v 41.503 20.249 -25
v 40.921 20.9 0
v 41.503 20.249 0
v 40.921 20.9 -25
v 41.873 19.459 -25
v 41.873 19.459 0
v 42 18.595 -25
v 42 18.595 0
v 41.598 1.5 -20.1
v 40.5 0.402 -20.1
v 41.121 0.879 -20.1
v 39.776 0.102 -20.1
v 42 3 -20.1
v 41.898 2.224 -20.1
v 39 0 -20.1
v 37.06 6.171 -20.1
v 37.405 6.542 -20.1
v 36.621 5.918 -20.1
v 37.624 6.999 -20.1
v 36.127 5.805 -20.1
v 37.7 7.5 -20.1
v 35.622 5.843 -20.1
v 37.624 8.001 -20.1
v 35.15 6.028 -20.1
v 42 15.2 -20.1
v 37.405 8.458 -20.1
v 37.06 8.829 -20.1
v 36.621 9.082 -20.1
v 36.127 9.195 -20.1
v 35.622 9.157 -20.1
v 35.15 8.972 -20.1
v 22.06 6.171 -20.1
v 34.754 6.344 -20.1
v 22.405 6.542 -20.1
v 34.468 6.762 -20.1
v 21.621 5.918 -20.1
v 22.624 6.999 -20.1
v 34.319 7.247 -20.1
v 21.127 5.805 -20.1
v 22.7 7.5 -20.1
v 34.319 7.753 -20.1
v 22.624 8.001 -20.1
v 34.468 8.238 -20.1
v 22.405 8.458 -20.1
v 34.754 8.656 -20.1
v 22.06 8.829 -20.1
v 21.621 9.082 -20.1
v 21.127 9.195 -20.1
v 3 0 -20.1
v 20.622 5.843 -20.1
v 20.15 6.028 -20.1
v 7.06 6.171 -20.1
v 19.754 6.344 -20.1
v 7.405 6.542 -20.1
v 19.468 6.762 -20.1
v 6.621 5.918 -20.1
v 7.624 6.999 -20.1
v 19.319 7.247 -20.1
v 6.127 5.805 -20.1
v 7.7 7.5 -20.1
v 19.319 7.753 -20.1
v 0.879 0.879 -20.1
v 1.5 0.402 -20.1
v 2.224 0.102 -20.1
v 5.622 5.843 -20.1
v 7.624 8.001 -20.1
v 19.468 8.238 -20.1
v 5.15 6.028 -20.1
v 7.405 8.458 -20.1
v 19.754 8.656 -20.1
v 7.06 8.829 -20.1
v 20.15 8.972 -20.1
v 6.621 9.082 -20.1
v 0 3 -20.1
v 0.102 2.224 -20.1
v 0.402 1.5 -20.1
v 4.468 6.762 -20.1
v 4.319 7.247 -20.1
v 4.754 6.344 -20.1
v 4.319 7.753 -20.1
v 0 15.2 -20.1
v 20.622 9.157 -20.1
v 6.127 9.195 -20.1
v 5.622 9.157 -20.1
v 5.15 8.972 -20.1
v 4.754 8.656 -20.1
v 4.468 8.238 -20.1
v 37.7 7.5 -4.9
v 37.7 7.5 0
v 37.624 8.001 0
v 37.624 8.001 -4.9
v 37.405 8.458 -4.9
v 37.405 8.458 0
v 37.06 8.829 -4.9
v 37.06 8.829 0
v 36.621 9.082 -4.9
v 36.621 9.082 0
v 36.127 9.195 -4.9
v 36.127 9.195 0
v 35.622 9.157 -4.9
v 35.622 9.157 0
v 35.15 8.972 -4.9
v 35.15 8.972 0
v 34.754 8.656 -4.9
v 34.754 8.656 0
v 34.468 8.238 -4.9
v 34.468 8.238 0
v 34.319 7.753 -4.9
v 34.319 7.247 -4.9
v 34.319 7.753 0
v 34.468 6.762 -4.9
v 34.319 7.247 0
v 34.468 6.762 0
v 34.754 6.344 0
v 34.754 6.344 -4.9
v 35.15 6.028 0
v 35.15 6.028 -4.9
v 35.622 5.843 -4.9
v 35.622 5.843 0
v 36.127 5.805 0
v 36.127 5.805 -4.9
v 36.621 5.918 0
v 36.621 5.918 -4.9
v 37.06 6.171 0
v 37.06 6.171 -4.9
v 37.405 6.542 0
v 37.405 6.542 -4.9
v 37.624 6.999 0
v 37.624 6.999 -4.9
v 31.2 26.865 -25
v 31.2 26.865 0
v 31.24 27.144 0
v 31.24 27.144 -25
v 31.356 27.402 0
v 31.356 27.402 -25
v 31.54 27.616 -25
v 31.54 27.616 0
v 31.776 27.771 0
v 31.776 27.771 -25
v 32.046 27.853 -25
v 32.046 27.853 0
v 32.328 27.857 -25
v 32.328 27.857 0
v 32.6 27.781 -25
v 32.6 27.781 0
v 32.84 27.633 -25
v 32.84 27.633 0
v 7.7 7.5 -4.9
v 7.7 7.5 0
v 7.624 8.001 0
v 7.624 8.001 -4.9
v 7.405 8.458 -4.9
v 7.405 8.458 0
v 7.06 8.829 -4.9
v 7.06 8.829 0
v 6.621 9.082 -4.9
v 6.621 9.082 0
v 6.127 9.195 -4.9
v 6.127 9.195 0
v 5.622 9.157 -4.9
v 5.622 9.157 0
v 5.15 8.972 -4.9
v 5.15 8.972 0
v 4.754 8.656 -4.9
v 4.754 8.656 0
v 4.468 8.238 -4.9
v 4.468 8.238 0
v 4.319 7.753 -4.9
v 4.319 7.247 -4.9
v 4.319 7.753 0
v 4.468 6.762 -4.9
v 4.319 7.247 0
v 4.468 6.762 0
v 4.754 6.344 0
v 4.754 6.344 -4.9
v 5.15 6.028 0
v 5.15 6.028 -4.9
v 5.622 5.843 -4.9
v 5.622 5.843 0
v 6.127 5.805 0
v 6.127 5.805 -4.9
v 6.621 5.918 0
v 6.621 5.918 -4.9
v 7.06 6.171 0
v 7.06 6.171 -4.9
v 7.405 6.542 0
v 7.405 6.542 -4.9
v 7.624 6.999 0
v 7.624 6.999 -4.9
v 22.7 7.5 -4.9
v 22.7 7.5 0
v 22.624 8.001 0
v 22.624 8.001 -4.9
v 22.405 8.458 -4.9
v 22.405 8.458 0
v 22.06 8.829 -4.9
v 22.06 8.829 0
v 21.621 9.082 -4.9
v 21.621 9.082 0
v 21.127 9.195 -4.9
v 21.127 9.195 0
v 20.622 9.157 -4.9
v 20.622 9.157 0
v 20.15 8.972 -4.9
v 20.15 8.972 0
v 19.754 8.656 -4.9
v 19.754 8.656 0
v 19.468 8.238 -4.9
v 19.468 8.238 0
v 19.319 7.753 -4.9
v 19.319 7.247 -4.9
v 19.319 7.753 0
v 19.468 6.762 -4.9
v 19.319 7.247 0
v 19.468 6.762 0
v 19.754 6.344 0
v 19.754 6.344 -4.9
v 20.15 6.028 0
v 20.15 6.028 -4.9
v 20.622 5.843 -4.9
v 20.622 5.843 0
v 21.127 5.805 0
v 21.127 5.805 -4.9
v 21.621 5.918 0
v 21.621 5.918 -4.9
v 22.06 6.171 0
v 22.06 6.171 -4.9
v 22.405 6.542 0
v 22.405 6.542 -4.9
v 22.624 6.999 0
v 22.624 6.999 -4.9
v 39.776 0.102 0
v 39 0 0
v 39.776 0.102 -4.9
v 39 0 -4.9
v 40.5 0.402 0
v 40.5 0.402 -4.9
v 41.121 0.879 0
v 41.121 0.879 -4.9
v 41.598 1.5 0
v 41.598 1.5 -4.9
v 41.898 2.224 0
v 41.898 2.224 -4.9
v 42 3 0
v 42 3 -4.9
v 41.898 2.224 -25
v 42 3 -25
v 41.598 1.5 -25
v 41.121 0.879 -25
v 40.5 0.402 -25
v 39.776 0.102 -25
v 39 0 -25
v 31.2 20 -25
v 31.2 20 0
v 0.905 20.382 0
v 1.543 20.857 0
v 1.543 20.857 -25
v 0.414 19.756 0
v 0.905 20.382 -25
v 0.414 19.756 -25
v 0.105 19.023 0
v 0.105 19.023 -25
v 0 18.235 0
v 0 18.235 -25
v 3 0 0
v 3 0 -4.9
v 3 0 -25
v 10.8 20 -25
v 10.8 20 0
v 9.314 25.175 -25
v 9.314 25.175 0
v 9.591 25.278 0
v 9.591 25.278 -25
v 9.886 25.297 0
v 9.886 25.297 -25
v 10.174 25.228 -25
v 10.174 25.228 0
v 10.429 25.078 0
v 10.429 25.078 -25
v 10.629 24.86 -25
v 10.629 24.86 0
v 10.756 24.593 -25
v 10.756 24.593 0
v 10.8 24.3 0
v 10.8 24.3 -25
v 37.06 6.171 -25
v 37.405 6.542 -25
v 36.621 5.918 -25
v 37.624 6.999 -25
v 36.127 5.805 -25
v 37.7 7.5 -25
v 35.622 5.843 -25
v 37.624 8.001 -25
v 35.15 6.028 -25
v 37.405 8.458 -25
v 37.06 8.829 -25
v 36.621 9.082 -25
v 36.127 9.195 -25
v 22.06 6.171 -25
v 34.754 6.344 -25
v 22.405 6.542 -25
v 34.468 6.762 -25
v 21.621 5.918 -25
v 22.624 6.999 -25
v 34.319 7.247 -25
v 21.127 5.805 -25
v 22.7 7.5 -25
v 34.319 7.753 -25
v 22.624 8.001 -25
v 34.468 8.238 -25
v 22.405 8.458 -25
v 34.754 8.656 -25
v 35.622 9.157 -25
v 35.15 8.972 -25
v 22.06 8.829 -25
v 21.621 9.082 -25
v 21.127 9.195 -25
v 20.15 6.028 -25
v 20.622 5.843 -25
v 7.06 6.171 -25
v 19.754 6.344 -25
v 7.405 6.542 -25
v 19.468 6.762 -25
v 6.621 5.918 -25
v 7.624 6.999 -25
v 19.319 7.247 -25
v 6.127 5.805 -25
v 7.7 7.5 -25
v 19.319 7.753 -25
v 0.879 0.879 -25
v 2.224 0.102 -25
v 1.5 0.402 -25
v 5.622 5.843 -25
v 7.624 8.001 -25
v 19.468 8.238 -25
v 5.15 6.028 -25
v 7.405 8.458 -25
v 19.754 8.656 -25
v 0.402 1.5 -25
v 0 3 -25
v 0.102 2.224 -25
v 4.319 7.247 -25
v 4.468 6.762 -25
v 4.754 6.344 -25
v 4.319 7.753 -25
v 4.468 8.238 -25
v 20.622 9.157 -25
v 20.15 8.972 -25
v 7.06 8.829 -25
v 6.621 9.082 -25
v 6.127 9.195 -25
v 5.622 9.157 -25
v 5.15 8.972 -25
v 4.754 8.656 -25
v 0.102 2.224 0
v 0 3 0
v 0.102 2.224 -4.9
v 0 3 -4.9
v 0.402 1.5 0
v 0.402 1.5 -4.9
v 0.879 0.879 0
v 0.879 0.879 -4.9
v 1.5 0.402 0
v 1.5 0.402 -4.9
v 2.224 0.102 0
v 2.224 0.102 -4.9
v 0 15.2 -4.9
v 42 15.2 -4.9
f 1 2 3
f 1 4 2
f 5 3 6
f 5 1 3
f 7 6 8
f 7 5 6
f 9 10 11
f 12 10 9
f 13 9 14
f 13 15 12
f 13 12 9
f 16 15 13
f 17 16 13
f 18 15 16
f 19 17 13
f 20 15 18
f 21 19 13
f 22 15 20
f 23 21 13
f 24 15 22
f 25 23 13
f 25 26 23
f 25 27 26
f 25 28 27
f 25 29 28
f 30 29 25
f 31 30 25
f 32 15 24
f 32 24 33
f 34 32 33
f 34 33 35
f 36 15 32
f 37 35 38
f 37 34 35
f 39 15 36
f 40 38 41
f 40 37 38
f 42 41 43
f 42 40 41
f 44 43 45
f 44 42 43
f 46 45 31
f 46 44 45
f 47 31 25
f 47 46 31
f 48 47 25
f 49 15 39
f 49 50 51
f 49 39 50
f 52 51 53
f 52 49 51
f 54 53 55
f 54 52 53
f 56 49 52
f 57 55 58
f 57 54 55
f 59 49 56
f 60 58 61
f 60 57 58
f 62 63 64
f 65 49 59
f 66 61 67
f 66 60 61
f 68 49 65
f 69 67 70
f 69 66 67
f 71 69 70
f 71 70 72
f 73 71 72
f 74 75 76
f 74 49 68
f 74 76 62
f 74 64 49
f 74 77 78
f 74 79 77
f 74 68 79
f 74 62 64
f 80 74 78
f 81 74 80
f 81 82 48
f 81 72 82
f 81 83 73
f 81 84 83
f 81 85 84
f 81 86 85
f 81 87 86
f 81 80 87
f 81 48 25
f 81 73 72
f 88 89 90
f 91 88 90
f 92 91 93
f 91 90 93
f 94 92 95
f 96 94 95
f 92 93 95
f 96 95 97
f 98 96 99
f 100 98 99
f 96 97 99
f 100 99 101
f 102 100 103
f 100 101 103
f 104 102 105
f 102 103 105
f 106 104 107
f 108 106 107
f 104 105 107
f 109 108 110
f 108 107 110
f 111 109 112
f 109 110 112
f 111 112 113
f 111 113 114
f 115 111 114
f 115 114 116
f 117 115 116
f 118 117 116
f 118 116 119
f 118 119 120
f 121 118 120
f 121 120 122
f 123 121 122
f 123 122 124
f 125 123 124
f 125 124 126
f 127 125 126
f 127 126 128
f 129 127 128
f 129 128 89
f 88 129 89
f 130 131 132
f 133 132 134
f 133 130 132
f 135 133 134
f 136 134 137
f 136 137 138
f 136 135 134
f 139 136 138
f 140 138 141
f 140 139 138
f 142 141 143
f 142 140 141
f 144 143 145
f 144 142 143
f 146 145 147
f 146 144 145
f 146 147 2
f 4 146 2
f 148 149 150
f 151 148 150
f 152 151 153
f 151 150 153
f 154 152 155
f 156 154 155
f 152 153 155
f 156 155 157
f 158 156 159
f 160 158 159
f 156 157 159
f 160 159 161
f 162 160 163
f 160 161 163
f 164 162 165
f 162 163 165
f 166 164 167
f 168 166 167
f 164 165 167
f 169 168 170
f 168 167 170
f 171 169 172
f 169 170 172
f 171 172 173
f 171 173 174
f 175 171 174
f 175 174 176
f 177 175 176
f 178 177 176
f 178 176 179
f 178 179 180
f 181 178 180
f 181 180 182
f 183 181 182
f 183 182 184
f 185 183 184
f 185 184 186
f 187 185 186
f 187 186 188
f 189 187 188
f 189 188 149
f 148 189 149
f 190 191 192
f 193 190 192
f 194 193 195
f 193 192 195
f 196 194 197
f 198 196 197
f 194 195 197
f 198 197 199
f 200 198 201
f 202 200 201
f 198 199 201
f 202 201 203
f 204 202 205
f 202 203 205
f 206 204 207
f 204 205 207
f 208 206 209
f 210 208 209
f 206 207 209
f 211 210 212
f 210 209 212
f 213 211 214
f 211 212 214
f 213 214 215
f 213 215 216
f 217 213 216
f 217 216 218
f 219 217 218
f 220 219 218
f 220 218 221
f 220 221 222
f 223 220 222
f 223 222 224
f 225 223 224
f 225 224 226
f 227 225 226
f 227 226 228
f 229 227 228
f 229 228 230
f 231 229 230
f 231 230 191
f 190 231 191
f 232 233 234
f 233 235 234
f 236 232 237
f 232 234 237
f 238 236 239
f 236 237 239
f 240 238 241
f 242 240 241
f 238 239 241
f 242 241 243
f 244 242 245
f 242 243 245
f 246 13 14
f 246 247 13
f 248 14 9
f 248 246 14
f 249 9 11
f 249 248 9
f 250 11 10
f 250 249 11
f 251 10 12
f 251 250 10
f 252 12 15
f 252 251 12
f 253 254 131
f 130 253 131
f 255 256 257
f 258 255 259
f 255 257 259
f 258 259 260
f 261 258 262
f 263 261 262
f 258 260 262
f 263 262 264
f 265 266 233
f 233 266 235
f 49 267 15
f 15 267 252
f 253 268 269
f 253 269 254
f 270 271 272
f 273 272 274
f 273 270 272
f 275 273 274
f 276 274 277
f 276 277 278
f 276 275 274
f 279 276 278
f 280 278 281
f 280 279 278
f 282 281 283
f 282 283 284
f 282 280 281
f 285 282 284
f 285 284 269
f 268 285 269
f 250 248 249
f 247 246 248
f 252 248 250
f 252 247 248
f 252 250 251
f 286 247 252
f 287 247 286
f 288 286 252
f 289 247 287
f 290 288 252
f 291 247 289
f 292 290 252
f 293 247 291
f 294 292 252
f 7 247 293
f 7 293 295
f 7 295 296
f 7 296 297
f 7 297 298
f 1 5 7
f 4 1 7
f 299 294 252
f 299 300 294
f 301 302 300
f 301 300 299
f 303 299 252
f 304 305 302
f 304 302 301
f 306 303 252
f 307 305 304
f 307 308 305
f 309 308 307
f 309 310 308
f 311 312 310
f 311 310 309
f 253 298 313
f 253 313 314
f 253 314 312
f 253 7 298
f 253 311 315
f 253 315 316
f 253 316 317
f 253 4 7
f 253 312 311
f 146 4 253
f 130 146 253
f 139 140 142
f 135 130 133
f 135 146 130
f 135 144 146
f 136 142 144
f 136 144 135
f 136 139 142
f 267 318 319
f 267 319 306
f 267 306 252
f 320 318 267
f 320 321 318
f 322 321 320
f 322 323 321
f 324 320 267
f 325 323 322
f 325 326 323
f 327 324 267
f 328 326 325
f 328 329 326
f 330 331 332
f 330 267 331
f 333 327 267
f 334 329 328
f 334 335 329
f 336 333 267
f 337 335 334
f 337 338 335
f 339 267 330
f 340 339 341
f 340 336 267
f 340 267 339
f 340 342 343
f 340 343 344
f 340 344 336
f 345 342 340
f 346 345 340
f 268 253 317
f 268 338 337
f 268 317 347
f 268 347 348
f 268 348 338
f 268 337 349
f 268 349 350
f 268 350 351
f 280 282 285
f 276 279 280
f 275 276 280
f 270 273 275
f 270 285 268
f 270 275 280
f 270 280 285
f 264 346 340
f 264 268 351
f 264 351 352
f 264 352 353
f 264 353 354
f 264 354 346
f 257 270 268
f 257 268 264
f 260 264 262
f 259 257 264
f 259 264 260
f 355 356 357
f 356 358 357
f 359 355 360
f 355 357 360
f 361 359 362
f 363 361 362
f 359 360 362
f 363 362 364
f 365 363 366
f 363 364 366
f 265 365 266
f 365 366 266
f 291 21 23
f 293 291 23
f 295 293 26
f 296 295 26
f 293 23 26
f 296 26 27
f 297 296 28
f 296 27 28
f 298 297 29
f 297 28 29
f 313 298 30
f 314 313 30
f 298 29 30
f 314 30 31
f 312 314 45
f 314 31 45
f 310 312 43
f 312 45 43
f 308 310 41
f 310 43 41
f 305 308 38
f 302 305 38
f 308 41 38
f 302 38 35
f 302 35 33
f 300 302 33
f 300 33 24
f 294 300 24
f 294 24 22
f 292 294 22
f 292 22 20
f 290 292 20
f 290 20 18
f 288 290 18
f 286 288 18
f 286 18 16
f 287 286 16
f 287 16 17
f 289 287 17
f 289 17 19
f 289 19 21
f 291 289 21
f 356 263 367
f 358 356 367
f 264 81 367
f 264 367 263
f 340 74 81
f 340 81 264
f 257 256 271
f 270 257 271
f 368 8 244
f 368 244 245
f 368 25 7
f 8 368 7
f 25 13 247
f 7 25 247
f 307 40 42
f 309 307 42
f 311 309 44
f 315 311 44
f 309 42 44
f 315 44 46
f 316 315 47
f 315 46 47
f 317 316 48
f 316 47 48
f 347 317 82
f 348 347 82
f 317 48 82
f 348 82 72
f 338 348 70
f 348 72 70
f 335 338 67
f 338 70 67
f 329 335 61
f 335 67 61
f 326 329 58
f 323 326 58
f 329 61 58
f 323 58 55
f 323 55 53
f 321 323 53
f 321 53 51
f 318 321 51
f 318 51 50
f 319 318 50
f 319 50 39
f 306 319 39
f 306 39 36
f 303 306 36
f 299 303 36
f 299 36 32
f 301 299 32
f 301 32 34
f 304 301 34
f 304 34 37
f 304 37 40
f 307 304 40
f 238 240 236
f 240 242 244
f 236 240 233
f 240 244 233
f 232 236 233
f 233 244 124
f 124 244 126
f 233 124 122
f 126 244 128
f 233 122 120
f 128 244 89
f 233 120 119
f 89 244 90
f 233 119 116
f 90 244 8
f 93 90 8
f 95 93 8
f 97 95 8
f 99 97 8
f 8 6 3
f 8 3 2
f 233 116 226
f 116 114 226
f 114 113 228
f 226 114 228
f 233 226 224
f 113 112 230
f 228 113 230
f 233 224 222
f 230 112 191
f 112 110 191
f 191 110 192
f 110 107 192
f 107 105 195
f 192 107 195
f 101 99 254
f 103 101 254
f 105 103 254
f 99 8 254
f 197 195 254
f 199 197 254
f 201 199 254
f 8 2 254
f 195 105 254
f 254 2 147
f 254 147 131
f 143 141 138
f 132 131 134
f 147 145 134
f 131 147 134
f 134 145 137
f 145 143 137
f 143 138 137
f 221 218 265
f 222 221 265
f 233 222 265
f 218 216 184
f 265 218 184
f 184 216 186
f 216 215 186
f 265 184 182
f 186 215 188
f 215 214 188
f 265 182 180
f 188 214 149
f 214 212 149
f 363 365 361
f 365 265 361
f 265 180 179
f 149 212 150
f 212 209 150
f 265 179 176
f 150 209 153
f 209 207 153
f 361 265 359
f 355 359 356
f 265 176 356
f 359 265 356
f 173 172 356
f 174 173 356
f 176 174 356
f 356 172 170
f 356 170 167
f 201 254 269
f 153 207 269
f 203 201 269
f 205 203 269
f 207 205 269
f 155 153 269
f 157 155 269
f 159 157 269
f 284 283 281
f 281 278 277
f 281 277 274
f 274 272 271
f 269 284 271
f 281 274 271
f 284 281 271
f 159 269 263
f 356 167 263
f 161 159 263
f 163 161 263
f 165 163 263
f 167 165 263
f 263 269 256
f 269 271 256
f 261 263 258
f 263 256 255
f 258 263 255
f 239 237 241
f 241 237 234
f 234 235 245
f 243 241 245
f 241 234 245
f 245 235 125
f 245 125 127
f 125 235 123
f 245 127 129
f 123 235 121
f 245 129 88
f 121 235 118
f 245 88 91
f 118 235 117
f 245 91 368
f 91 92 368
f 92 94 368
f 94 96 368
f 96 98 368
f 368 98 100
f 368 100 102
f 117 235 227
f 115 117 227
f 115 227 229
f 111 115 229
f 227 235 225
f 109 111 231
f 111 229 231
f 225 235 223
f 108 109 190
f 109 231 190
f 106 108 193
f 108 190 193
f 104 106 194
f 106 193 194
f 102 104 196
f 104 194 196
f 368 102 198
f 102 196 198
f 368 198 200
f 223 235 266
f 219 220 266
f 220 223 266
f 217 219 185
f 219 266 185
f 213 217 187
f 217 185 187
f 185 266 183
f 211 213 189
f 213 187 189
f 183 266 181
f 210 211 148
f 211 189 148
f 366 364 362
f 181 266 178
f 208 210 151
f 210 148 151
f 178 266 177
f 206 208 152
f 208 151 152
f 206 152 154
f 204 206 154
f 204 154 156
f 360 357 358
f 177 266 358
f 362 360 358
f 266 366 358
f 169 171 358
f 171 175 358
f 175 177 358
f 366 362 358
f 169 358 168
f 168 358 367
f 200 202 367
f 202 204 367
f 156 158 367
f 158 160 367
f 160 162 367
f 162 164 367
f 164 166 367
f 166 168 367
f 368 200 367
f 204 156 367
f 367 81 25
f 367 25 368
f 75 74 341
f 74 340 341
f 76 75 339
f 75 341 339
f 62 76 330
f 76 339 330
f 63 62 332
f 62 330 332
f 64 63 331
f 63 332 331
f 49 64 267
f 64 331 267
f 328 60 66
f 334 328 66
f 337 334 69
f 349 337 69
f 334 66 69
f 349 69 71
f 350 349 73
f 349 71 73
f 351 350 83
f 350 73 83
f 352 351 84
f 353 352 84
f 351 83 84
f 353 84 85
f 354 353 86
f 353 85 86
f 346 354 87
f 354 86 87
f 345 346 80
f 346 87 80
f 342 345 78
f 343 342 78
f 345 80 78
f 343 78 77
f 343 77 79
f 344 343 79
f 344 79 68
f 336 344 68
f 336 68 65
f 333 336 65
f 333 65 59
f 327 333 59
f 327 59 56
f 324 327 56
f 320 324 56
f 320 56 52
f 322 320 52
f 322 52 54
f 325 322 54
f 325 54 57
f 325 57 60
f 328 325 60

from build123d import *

# Parameters (mm, degrees)
SKETCH_1_W          = 42
SKETCH_1_H          = 25
EXTRUDE_1_DEPTH     = 20
SKETCH_2_W          = 15.2
SKETCH_2_H          = 15.2
CUT_EXTRUDE_1_DEPTH = 53.810983706
EXTRUDE_2_DEPTH     = 25
SKETCH_5_R          = 1.7
CUT_EXTRUDE_2_DEPTH = 57.833088954
FILLET_1_R          = 3
FILLET_3_R          = 1


with BuildPart() as part:
    # 草图1 → 凸台-拉伸1 (new body)
    with BuildSketch(Plane(origin=(0, 0, 0), x_dir=(1, 0, 0), z_dir=(0, 1, 0))):
        with Locations((21, 12.5)):
            Rectangle(SKETCH_1_W, SKETCH_1_H)
    extrude(amount=EXTRUDE_1_DEPTH)

    # 草图2 → 切除-拉伸1 (cut, through all)
    with BuildSketch(Plane.ZY):
        with Locations((-12.5, 7.6)):
            Rectangle(SKETCH_2_W, SKETCH_2_H)
    extrude(amount=-CUT_EXTRUDE_1_DEPTH, mode=Mode.SUBTRACT)

    # 草图4 → 凸台-拉伸2 (add)
    with BuildSketch(Plane.XY):
        Polygon((10.8, 26), (10.8, 20), (0, 20), align=None)
        Polygon((31.2, 20), (31.2, 29), (42, 20), align=None)
    extrude(amount=-EXTRUDE_2_DEPTH)

    # 草图5 → 切除-拉伸2 (cut, through all)
    with BuildSketch(Plane.XY):
        with Locations((6, 7.5)):
            Circle(SKETCH_5_R)
        with Locations((21, 7.5)):
            Circle(SKETCH_5_R)
        with Locations((36, 7.5)):
            Circle(SKETCH_5_R)
    extrude(amount=-CUT_EXTRUDE_2_DEPTH, mode=Mode.SUBTRACT)

    # 圆角1
    fillet_1_edges = [part.edges().sort_by_distance(p)[0] for p in [
        (42, 20, -12.5),
        (0, 0, -2.45),
        (42, 0, -22.55),
        (0, 20, -12.5),
        (42, 0, -2.45),
        (0, 0, -22.55),
    ]]
    fillet(fillet_1_edges, radius=FILLET_1_R)

    # 圆角3
    fillet_3_edges = [part.edges().sort_by_distance(p)[0] for p in [
        (10.8, 26, -12.5),
        (31.2, 29, -12.5),
    ]]
    fillet(fillet_3_edges, radius=FILLET_3_R)


solid = part.part
